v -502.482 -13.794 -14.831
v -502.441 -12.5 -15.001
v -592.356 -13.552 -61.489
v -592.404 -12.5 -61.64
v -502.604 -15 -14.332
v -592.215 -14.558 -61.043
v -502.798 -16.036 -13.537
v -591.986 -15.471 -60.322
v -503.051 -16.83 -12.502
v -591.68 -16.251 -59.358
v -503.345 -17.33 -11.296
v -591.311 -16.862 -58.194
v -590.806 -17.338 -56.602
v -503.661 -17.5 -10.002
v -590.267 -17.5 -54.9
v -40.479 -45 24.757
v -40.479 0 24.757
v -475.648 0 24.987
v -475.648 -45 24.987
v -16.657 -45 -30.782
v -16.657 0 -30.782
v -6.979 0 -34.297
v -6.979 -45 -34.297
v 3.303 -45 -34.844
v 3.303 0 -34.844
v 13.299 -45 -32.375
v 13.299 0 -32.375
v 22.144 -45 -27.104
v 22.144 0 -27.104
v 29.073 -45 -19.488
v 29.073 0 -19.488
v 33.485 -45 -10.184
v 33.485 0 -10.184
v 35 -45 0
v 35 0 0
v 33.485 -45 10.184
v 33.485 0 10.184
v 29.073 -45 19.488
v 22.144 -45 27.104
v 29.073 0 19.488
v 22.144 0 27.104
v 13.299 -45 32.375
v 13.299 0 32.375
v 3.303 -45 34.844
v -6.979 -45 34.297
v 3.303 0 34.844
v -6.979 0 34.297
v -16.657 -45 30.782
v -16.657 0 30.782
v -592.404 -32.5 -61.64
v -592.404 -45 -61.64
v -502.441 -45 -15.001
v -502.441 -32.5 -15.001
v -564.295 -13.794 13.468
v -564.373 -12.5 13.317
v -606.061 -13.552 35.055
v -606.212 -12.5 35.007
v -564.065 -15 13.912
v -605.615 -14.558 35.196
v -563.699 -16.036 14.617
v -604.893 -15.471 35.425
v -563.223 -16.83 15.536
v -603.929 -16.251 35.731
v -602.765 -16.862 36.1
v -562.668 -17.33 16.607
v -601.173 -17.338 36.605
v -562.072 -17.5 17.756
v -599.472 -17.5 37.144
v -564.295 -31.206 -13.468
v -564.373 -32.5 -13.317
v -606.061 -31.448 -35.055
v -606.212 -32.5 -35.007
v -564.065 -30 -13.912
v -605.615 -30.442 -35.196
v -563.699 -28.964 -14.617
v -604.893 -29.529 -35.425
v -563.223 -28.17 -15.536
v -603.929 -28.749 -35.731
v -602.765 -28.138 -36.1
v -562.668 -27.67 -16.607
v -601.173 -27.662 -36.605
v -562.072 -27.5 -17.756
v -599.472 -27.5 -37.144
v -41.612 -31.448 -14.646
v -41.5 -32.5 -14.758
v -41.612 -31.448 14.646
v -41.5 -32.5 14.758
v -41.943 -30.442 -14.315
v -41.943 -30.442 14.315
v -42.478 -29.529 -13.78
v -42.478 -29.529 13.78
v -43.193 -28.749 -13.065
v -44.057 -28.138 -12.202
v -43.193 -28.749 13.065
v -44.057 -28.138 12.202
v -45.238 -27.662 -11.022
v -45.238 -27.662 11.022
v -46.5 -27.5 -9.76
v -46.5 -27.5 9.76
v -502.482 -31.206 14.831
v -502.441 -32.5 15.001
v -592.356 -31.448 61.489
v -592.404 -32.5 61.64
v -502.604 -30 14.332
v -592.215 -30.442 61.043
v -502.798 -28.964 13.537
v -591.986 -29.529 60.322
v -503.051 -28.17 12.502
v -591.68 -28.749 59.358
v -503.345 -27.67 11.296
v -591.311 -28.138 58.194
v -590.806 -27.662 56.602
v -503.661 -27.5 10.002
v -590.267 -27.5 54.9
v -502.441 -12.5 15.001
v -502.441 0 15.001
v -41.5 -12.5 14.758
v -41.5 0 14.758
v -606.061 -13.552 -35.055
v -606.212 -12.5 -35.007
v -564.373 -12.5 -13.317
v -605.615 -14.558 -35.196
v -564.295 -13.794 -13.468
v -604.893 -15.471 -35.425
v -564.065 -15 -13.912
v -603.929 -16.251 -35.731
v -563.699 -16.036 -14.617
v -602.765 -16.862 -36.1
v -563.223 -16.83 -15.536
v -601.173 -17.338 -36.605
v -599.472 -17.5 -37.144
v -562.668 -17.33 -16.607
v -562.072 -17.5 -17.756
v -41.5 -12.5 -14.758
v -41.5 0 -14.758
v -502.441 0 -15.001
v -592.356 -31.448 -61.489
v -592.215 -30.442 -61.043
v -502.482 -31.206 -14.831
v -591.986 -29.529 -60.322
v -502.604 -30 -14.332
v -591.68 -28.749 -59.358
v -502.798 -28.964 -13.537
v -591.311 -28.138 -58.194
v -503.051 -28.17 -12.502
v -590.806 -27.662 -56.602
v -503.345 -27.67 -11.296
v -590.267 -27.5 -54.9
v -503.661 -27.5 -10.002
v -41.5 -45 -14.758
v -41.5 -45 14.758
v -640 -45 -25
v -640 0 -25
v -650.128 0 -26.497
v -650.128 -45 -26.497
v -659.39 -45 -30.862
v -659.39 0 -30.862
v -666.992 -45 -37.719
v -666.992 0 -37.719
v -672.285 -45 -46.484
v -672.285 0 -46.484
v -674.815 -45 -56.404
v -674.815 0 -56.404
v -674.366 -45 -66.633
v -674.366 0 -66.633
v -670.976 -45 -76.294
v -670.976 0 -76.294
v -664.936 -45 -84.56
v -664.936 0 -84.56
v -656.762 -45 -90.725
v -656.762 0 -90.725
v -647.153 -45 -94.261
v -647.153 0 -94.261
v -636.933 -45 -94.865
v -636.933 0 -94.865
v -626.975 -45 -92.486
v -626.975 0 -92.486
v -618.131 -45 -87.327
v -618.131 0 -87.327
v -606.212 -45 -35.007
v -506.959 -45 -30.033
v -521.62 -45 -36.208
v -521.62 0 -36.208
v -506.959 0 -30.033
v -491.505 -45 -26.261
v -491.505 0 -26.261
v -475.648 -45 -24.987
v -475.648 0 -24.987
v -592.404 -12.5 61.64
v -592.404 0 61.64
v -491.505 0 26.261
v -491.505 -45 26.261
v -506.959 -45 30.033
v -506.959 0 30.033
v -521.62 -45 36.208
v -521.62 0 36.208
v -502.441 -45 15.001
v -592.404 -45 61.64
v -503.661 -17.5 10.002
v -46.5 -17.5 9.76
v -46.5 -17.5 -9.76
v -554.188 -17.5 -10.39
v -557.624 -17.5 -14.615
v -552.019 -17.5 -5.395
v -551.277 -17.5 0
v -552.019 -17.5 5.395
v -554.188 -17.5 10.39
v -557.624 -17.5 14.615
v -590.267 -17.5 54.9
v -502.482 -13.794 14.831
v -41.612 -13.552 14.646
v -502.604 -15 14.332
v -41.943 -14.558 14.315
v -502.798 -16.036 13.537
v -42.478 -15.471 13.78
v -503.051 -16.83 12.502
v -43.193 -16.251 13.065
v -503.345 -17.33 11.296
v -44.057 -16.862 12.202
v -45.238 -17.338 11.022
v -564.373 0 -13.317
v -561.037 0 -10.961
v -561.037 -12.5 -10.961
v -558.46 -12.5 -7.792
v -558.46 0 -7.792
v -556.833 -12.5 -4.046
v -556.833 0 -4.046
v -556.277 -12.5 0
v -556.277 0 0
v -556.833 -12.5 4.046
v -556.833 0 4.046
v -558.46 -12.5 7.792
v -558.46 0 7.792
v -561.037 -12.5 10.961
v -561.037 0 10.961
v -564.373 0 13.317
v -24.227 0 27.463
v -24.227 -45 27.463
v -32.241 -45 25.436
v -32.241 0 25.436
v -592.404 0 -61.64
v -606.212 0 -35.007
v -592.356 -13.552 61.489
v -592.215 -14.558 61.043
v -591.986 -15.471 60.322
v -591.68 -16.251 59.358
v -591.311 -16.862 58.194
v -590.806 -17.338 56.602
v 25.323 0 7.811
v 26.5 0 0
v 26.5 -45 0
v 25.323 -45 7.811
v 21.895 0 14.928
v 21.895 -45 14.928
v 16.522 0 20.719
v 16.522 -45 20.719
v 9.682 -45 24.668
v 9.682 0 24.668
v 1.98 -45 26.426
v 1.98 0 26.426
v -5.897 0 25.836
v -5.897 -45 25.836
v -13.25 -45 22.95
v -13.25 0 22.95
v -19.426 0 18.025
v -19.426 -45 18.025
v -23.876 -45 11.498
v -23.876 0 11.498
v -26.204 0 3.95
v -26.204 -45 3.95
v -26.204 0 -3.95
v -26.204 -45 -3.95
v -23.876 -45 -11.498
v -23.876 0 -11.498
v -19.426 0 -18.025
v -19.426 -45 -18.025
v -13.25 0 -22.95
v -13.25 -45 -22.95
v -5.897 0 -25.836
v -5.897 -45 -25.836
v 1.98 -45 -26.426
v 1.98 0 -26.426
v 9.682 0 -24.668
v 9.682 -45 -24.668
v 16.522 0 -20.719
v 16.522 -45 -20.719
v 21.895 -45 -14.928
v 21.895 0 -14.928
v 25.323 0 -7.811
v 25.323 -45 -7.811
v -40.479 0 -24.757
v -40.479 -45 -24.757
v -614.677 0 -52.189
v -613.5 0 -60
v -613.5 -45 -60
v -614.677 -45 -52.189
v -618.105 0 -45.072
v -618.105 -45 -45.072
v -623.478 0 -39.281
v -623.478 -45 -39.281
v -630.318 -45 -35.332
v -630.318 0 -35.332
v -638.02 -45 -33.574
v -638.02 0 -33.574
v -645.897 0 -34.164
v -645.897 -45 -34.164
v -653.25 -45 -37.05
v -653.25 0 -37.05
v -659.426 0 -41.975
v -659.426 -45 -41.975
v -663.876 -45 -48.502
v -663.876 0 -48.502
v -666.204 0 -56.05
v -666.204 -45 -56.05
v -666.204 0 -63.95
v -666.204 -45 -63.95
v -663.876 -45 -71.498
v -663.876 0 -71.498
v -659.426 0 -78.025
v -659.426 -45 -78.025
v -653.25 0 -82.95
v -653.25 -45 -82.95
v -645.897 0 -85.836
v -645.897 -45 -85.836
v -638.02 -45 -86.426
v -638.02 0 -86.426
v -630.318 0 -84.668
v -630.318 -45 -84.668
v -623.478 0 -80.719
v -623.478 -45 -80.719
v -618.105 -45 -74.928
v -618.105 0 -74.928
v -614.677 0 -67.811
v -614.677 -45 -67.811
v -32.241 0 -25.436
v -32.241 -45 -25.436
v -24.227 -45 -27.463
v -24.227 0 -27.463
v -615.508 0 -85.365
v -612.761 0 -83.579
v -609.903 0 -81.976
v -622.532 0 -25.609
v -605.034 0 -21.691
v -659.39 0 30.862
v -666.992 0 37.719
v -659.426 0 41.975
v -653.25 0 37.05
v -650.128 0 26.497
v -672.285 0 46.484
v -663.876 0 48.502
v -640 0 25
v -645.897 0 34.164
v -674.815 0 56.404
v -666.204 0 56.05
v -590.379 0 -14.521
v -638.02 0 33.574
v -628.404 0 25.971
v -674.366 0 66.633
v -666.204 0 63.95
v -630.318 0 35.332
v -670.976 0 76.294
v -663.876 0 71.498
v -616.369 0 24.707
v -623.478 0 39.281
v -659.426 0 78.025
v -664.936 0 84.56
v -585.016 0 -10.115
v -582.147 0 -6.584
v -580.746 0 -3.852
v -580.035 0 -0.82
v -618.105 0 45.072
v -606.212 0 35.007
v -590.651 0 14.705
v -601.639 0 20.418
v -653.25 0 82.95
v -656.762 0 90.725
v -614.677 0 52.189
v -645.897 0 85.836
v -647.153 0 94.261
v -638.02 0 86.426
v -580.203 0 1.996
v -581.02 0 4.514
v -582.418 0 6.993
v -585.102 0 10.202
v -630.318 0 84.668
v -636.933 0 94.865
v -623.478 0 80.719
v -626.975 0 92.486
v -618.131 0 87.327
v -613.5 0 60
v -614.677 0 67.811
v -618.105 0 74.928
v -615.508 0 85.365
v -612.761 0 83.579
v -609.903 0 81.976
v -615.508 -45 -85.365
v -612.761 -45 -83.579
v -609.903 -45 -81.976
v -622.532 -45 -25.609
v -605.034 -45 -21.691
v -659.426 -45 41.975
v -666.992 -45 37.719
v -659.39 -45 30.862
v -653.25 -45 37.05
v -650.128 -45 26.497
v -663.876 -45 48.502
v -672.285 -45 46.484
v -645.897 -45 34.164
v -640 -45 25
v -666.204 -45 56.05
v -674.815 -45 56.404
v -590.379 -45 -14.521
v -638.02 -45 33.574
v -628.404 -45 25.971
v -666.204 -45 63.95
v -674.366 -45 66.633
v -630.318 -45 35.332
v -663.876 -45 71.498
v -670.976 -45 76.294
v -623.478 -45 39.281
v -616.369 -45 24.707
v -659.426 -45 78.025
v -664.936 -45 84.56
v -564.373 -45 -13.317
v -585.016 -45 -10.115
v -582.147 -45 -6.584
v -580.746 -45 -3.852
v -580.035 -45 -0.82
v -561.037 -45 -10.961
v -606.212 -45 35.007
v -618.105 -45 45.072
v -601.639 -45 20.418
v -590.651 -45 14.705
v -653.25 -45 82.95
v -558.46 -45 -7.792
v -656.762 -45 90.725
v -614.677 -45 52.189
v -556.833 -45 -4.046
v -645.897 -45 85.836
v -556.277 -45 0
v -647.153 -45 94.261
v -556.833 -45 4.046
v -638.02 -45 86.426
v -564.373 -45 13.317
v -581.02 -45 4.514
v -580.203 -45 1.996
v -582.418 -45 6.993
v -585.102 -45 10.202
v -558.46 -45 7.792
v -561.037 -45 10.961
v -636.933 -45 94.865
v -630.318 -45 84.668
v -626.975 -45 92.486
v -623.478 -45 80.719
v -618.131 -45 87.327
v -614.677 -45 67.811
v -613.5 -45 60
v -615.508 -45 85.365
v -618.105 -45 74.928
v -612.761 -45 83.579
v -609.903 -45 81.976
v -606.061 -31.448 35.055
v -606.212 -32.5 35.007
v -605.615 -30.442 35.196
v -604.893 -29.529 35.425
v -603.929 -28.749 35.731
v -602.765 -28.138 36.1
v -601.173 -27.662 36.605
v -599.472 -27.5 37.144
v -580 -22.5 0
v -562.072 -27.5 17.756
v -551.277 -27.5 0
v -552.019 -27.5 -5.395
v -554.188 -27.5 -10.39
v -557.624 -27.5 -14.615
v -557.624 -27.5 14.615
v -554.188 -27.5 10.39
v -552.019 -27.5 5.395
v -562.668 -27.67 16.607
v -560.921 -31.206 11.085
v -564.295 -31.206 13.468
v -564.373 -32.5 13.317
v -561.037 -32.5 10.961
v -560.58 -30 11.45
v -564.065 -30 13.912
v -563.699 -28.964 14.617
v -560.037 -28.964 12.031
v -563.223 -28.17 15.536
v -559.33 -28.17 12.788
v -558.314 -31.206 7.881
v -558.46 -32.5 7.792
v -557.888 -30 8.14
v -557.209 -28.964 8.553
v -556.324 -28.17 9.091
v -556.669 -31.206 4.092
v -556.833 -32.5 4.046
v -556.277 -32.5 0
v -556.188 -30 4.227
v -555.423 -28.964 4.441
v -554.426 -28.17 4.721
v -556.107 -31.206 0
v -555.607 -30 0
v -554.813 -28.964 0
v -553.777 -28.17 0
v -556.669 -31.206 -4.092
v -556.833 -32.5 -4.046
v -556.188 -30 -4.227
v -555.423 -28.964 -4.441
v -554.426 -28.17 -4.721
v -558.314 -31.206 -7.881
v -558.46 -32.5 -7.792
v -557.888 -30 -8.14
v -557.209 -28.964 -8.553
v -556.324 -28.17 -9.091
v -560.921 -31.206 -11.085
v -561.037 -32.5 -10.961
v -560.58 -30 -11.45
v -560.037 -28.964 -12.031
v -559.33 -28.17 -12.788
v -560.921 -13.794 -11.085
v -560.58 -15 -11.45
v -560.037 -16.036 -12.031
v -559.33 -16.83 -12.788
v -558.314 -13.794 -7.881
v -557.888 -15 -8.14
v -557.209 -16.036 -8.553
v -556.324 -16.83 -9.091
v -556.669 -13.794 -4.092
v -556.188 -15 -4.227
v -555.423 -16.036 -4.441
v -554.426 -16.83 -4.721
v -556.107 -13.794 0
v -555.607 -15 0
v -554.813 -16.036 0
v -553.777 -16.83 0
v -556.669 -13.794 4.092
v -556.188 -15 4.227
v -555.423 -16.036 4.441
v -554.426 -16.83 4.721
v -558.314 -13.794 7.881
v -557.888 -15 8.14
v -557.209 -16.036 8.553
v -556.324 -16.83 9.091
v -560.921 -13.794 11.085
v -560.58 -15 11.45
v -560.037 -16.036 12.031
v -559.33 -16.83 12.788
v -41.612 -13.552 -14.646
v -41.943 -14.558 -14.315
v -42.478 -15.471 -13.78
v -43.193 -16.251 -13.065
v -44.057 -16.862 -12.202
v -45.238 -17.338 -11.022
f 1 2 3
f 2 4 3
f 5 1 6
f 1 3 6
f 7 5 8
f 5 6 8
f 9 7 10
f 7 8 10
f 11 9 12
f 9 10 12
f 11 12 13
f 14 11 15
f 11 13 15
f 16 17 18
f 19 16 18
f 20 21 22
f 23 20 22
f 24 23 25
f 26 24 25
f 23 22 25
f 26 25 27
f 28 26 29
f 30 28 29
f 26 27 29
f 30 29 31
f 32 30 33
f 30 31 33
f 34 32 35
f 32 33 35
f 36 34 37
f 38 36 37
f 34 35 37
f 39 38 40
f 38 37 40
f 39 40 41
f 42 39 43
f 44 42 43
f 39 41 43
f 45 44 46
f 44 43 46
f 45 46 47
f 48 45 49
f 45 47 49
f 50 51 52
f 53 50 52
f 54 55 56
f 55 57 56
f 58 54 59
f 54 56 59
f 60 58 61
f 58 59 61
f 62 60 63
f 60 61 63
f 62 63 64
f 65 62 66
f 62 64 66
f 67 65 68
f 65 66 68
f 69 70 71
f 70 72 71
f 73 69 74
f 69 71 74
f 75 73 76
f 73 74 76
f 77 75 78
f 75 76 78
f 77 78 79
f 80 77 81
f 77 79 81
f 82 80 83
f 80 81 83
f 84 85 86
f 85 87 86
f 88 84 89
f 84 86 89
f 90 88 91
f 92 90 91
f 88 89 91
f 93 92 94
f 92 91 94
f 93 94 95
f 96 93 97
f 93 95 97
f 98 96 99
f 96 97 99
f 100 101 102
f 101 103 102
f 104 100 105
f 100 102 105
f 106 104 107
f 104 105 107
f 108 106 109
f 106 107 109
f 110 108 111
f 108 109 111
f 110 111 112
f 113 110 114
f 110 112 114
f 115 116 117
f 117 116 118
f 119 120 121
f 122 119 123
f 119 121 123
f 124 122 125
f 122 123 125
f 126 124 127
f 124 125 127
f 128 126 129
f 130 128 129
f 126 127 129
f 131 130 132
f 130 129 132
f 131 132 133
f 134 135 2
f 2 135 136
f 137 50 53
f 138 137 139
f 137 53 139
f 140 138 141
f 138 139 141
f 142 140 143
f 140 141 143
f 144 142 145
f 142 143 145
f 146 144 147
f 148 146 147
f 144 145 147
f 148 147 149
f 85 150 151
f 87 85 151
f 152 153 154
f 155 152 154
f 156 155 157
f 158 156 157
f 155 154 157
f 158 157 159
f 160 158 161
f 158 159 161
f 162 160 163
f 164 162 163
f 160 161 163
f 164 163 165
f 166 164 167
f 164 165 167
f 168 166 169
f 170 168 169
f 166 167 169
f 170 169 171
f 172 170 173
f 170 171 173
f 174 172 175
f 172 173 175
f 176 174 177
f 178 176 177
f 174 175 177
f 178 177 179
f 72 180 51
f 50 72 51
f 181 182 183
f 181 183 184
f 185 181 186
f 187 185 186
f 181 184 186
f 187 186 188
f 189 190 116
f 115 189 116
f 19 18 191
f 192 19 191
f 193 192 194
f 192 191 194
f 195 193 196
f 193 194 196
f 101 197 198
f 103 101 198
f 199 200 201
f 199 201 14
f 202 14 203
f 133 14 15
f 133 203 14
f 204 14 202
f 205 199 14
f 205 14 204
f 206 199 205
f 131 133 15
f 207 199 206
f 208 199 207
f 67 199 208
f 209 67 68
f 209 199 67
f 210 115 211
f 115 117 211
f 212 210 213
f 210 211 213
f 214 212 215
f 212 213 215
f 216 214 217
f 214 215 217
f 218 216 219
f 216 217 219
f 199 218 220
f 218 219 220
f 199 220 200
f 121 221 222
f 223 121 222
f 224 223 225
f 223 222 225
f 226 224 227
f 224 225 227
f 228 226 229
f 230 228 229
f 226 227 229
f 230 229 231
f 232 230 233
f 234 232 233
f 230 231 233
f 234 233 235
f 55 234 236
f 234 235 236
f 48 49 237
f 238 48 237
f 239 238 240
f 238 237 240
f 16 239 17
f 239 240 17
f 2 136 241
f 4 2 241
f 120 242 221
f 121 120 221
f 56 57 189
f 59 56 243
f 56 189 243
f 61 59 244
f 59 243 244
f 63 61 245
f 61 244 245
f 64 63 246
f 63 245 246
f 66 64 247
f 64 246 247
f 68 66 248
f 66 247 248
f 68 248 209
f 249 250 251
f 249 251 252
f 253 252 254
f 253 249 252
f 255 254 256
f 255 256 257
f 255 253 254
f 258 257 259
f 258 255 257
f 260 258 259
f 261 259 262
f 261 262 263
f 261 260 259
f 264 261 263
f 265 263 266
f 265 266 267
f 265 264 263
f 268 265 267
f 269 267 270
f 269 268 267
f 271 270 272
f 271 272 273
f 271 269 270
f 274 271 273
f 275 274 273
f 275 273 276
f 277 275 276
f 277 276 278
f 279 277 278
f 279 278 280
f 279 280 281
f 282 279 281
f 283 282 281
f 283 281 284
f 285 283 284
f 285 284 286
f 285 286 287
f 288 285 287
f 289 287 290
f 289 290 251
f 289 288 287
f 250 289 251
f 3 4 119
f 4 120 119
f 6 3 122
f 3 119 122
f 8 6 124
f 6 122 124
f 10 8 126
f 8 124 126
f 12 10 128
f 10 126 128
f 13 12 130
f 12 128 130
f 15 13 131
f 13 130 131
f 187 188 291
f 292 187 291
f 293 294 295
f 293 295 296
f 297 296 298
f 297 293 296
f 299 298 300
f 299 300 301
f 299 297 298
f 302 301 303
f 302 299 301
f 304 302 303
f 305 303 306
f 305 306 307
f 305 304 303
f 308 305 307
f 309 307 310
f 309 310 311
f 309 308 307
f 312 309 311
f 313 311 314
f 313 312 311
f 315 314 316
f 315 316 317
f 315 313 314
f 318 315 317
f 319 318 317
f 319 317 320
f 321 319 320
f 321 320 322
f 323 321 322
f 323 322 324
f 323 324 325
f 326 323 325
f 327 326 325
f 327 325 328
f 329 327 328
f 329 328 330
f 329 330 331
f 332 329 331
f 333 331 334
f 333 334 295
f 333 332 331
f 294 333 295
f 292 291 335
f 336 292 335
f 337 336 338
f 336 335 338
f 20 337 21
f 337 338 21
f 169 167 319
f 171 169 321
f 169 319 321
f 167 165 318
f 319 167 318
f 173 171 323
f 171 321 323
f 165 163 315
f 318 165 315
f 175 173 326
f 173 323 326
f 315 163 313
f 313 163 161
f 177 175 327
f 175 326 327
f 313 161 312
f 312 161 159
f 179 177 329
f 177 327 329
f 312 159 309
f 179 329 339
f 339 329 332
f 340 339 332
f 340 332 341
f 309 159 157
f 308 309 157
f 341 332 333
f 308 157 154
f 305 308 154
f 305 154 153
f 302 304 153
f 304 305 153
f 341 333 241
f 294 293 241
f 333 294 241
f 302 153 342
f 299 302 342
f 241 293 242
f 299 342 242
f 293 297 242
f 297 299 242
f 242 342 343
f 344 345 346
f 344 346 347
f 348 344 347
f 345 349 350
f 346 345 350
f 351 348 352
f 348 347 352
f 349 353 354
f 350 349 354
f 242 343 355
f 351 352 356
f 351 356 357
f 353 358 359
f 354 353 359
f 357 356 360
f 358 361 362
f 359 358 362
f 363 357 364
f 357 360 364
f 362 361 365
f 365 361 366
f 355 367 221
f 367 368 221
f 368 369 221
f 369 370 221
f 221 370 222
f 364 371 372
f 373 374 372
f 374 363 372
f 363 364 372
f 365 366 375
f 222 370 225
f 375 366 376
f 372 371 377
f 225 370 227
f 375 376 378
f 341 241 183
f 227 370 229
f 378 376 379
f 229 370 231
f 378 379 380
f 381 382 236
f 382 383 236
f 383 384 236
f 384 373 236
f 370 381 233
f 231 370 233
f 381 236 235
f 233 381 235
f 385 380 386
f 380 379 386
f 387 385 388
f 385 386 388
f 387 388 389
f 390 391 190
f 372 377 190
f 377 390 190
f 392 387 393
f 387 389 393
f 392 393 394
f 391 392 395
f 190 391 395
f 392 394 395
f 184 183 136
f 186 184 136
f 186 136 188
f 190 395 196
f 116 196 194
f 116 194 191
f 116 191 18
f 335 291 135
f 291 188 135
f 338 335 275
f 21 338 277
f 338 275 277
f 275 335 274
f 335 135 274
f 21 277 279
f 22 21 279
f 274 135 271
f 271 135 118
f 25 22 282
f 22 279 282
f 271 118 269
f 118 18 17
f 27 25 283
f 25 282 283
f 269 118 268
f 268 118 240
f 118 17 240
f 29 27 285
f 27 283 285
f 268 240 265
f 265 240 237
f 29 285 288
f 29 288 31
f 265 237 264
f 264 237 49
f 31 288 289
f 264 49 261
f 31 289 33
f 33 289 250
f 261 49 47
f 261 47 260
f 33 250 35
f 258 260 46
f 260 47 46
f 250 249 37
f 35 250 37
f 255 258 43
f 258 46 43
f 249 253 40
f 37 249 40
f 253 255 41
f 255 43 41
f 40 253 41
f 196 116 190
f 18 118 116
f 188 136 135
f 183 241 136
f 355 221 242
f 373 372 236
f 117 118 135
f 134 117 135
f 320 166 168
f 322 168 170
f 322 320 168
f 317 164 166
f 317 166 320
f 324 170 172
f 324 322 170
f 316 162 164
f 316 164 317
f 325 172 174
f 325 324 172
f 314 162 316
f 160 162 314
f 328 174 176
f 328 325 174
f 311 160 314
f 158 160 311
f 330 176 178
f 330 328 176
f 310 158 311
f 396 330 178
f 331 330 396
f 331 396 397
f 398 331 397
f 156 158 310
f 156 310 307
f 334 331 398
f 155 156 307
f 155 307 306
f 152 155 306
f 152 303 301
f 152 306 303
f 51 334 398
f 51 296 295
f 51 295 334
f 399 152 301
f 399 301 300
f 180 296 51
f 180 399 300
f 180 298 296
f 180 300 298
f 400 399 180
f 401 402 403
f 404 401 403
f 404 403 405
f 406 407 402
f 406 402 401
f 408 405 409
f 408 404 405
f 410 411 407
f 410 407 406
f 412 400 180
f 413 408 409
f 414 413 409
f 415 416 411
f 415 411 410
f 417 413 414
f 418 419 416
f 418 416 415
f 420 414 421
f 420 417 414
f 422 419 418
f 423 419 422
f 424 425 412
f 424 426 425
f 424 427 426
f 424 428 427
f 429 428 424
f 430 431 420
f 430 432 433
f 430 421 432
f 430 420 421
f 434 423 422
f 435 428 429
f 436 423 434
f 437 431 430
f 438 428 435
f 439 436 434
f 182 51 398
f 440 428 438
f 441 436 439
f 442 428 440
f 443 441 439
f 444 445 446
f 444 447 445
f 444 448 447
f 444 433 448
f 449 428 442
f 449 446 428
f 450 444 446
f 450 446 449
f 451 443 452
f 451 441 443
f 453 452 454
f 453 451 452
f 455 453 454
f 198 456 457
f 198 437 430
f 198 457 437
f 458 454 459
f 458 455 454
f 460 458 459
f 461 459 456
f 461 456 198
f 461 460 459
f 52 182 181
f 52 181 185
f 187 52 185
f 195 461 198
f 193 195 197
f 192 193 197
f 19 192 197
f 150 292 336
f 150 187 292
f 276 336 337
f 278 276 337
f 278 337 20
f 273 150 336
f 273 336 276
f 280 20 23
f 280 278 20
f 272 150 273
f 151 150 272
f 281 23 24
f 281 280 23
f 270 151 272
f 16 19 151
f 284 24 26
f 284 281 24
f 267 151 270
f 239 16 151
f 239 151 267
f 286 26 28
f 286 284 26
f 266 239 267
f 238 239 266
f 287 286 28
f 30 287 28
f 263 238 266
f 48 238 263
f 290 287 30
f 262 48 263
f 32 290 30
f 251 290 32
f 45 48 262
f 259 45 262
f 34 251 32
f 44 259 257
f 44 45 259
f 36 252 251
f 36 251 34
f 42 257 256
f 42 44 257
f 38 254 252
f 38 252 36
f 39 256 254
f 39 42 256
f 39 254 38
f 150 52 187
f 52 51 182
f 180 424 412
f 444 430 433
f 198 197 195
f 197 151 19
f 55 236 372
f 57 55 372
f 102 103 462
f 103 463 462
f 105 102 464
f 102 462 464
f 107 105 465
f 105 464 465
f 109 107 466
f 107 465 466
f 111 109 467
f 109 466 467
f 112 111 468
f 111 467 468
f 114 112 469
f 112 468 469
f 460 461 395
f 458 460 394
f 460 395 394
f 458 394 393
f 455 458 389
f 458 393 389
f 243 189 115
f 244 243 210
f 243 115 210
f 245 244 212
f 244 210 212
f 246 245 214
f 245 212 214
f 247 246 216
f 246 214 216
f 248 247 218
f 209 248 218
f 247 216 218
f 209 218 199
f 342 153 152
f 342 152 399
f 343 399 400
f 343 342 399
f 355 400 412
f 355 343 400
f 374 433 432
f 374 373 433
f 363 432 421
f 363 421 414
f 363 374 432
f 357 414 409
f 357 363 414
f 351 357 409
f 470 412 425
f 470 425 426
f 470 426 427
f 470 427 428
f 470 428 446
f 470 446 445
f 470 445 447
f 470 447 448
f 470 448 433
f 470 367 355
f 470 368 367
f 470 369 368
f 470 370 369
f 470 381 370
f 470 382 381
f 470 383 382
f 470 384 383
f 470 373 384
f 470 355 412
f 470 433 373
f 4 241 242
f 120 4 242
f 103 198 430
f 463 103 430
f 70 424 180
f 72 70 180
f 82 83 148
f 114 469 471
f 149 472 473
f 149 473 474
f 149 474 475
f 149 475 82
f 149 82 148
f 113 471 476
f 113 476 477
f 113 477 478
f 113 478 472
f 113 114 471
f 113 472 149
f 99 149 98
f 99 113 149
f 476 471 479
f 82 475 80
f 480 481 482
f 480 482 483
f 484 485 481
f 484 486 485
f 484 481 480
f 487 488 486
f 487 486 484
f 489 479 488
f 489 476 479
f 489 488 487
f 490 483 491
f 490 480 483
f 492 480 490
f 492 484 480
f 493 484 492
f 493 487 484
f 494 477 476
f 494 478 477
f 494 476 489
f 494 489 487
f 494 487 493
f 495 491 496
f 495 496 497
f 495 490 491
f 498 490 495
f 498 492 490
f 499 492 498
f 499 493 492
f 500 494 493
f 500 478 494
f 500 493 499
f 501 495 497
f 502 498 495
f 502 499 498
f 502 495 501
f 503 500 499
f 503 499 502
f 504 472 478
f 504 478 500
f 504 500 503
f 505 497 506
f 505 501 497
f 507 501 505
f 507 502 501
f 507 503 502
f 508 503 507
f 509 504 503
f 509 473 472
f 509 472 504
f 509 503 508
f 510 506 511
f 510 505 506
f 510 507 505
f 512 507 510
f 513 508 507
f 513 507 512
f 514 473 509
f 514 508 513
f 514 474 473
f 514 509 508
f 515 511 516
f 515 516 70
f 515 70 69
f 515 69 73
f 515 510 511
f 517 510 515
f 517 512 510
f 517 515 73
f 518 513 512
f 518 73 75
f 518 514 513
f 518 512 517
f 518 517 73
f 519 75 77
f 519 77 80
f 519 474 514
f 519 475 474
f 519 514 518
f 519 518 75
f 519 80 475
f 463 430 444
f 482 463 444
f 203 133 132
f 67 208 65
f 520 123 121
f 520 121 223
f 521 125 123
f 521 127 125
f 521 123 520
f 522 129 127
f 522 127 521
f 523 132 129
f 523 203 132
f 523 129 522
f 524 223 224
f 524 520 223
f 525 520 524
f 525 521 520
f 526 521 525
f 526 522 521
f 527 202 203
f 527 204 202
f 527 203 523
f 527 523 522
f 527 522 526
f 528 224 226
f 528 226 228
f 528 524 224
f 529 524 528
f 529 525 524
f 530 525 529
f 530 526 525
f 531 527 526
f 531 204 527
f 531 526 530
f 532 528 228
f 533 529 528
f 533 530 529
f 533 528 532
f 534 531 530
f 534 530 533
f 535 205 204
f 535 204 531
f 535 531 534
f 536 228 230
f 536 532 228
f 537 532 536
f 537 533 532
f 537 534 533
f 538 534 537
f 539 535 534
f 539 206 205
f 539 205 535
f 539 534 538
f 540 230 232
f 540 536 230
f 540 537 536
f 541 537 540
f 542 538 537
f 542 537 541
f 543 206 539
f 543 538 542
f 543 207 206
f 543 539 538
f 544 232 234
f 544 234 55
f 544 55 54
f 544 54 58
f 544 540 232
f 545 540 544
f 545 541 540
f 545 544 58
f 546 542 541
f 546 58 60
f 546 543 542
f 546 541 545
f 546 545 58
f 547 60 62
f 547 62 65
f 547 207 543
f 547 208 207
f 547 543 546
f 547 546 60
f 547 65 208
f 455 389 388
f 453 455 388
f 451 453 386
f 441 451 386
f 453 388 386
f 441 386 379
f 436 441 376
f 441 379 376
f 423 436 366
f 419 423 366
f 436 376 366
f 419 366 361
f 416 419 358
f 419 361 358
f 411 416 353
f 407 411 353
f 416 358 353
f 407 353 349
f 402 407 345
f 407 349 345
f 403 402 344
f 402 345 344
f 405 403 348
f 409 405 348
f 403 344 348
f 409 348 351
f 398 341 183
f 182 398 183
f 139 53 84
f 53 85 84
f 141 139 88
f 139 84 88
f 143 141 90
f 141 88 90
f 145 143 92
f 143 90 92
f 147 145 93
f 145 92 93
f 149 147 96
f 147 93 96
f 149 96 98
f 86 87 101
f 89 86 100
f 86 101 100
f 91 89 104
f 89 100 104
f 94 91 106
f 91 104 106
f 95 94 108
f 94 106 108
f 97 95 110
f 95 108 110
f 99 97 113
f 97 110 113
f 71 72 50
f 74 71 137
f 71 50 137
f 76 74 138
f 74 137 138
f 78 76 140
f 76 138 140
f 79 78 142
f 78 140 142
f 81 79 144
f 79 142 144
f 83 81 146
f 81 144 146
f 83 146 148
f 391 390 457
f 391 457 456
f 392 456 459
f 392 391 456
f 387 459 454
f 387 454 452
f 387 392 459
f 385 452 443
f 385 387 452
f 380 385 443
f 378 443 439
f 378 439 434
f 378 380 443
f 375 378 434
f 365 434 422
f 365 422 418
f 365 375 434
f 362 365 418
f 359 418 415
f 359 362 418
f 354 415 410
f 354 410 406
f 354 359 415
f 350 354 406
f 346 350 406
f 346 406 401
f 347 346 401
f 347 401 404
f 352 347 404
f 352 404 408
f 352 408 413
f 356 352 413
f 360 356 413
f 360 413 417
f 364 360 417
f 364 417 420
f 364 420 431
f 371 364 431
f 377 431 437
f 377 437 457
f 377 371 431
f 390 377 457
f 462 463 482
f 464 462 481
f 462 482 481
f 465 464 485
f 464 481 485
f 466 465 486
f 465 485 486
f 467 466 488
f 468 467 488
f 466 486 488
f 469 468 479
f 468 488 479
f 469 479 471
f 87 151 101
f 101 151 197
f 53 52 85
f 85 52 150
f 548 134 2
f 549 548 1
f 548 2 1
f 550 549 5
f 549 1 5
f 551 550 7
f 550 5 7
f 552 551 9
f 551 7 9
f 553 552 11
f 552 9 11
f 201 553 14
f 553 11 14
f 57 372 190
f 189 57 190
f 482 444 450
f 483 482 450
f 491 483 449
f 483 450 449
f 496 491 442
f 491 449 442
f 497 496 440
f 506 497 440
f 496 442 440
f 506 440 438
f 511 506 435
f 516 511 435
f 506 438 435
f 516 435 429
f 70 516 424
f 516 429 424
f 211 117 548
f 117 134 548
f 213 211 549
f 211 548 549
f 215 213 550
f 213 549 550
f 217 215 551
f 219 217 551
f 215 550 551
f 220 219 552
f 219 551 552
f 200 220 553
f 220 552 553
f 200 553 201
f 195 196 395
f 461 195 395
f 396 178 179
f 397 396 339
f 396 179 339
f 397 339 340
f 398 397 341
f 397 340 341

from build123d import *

# Parameters (mm, degrees)
F0_R     = 26.5
F1_DEPTH = 45
F2_ANGLE = 12.5
F4_DEPTH = 17.5
F6_DEPTH = 17.5
F7_R     = 5
F8_R     = 5


with BuildPart() as f1:
    # F0 (on Front) → F1 (new body)
    with BuildSketch(Plane.XZ):
        with BuildLine():
            ThreePointArc((-40.478678, -24.757054), (-28.191847, -26.283521), (-16.656806, -30.782313))
            ThreePointArc((-16.656806, -30.782313), (35, 0), (-16.656806, 30.782313))
            ThreePointArc((-16.656806, 30.782313), (-28.191847, 26.283521), (-40.478678, 24.757054))
            Line((-40.478678, 24.757054), (-475.64768, 24.987125))
            ThreePointArc((-475.64768, 24.987125), (-499.307017, 27.839125), (-521.619742, 36.20814))
            Line((-521.619742, 36.20814), (-609.903107, 81.976138))
            ThreePointArc((-609.903107, 81.976138), (-614.148891, 84.449185), (-618.13144, 87.327022))
            ThreePointArc((-618.13144, 87.327022), (-673.026094, 71.587801), (-640, 25))
            add(Edge.make_bspline(
                [(-640, -25), (-615, -30), (-545, 0), (-615, 30), (-640, 25)],
                knots=[0, 0, 0, 0, 65, 130, 130, 130, 130], degree=3))
            ThreePointArc((-640, -25), (-673.026094, -71.587801), (-618.13144, -87.327022))
            ThreePointArc((-618.13144, -87.327022), (-614.148891, -84.449185), (-609.903107, -81.976138))
            Line((-609.903107, -81.976138), (-521.619742, -36.20814))
            ThreePointArc((-521.619742, -36.20814), (-499.307017, -27.839125), (-475.64768, -24.987125))
            Line((-475.64768, -24.987125), (-40.478678, -24.757054))
        make_face()
        with Locations((-640, -60)):
            Circle(F0_R, mode=Mode.SUBTRACT)
        with Locations((-640, 60)):
            Circle(F0_R, mode=Mode.SUBTRACT)
        Circle(F0_R, mode=Mode.SUBTRACT)
    extrude(amount=F1_DEPTH)


with BuildPart() as f2_1:
    # F2: copy of F1
    add(f1.part.rotate(Axis((0, -45, 0), (0, -1, 0)), F2_ANGLE))


with BuildPart() as f4_tool:
    # F3 (on face) → F4 (new body)
    with BuildSketch(Plane.XZ.offset(45)):
        with BuildLine():
            Line((-41.5, -14.757592), (-41.5, 14.757592))
            Line((-41.5, 14.757592), (-502.440519, 15.001289))
            Line((-502.440519, 15.001289), (-592.404261, 61.640431))
            Line((-592.404261, 61.640431), (-606.211741, 35.00674))
            Line((-606.211741, 35.00674), (-564.373406, 13.316846))
            ThreePointArc((-564.373406, 13.316846), (-556.277146, 0), (-564.373406, -13.316846))
            Line((-564.373406, -13.316846), (-606.211741, -35.00674))
            Line((-606.211741, -35.00674), (-592.404261, -61.640431))
            Line((-592.404261, -61.640431), (-502.440519, -15.001289))
            Line((-502.440519, -15.001289), (-41.5, -14.757592))
        make_face()
    extrude(amount=-F4_DEPTH)


with BuildPart() as f1_1:
    add(f1.part)

    # F4: cut by f4_tool
    add(f4_tool.part, mode=Mode.SUBTRACT)


with BuildPart() as f2_1_1:
    add(f2_1.part)

    # F4: cut by f4_tool
    add(f4_tool.part, mode=Mode.SUBTRACT)


with BuildPart() as f6_tool:
    # F5 (on face) → F6 (new body)
    with BuildSketch(Plane(origin=(0, 0, 0), x_dir=(-1, 0, 0), z_dir=(0, 1, 0))):
        with BuildLine():
            Line((502.440519, 15.001289), (41.5, 14.757592))
            Line((41.5, 14.757592), (41.5, -14.757592))
            Line((41.5, -14.757592), (502.440519, -15.001289))
            Line((502.440519, -15.001289), (592.404261, -61.640431))
            Line((592.404261, -61.640431), (606.211741, -35.00674))
            Line((606.211741, -35.00674), (564.373406, -13.316846))
            ThreePointArc((564.373406, -13.316846), (556.277146, 0), (564.373406, 13.316846))
            Line((564.373406, 13.316846), (606.211741, 35.00674))
            Line((606.211741, 35.00674), (592.404261, 61.640431))
            Line((592.404261, 61.640431), (502.440519, 15.001289))
        make_face()
    extrude(amount=-F6_DEPTH)


with BuildPart() as f1_2:
    add(f1_1.part)

    # F6: cut by f6_tool
    add(f6_tool.part, mode=Mode.SUBTRACT)

    # F7
    f7_edges = [f1_2.edges().sort_by_distance(p)[0] for p in [
        (-271.970259, -17.5, 14.879441),
        (-41.5, -17.5, 0),
        (-271.970259, -17.5, -14.879441),
        (-547.42239, -17.5, 38.32086),
        (-547.42239, -17.5, -38.32086),
        (-599.308001, -17.5, -48.323585),
        (-585.292573, -17.5, -24.161793),
        (-599.308001, -17.5, 48.323585),
    ]]
    fillet(f7_edges, radius=F7_R)

    # F8
    f8_edges = [f1_2.edges().sort_by_distance(p)[0] for p in [
        (-599.308001, -27.5, -48.323585),
        (-547.42239, -27.5, -38.32086),
        (-271.970259, -27.5, -14.879441),
        (-585.292573, -27.5, 24.161793),
        (-599.308001, -27.5, 48.323585),
        (-547.42239, -27.5, 38.32086),
        (-271.970259, -27.5, 14.879441),
        (-41.5, -27.5, 0),
    ]]
    fillet(f8_edges, radius=F8_R)


with BuildPart() as f2_1_2:
    add(f2_1_1.part)

    # F6: cut by f6_tool
    add(f6_tool.part, mode=Mode.SUBTRACT)


solid = f1_2.part
